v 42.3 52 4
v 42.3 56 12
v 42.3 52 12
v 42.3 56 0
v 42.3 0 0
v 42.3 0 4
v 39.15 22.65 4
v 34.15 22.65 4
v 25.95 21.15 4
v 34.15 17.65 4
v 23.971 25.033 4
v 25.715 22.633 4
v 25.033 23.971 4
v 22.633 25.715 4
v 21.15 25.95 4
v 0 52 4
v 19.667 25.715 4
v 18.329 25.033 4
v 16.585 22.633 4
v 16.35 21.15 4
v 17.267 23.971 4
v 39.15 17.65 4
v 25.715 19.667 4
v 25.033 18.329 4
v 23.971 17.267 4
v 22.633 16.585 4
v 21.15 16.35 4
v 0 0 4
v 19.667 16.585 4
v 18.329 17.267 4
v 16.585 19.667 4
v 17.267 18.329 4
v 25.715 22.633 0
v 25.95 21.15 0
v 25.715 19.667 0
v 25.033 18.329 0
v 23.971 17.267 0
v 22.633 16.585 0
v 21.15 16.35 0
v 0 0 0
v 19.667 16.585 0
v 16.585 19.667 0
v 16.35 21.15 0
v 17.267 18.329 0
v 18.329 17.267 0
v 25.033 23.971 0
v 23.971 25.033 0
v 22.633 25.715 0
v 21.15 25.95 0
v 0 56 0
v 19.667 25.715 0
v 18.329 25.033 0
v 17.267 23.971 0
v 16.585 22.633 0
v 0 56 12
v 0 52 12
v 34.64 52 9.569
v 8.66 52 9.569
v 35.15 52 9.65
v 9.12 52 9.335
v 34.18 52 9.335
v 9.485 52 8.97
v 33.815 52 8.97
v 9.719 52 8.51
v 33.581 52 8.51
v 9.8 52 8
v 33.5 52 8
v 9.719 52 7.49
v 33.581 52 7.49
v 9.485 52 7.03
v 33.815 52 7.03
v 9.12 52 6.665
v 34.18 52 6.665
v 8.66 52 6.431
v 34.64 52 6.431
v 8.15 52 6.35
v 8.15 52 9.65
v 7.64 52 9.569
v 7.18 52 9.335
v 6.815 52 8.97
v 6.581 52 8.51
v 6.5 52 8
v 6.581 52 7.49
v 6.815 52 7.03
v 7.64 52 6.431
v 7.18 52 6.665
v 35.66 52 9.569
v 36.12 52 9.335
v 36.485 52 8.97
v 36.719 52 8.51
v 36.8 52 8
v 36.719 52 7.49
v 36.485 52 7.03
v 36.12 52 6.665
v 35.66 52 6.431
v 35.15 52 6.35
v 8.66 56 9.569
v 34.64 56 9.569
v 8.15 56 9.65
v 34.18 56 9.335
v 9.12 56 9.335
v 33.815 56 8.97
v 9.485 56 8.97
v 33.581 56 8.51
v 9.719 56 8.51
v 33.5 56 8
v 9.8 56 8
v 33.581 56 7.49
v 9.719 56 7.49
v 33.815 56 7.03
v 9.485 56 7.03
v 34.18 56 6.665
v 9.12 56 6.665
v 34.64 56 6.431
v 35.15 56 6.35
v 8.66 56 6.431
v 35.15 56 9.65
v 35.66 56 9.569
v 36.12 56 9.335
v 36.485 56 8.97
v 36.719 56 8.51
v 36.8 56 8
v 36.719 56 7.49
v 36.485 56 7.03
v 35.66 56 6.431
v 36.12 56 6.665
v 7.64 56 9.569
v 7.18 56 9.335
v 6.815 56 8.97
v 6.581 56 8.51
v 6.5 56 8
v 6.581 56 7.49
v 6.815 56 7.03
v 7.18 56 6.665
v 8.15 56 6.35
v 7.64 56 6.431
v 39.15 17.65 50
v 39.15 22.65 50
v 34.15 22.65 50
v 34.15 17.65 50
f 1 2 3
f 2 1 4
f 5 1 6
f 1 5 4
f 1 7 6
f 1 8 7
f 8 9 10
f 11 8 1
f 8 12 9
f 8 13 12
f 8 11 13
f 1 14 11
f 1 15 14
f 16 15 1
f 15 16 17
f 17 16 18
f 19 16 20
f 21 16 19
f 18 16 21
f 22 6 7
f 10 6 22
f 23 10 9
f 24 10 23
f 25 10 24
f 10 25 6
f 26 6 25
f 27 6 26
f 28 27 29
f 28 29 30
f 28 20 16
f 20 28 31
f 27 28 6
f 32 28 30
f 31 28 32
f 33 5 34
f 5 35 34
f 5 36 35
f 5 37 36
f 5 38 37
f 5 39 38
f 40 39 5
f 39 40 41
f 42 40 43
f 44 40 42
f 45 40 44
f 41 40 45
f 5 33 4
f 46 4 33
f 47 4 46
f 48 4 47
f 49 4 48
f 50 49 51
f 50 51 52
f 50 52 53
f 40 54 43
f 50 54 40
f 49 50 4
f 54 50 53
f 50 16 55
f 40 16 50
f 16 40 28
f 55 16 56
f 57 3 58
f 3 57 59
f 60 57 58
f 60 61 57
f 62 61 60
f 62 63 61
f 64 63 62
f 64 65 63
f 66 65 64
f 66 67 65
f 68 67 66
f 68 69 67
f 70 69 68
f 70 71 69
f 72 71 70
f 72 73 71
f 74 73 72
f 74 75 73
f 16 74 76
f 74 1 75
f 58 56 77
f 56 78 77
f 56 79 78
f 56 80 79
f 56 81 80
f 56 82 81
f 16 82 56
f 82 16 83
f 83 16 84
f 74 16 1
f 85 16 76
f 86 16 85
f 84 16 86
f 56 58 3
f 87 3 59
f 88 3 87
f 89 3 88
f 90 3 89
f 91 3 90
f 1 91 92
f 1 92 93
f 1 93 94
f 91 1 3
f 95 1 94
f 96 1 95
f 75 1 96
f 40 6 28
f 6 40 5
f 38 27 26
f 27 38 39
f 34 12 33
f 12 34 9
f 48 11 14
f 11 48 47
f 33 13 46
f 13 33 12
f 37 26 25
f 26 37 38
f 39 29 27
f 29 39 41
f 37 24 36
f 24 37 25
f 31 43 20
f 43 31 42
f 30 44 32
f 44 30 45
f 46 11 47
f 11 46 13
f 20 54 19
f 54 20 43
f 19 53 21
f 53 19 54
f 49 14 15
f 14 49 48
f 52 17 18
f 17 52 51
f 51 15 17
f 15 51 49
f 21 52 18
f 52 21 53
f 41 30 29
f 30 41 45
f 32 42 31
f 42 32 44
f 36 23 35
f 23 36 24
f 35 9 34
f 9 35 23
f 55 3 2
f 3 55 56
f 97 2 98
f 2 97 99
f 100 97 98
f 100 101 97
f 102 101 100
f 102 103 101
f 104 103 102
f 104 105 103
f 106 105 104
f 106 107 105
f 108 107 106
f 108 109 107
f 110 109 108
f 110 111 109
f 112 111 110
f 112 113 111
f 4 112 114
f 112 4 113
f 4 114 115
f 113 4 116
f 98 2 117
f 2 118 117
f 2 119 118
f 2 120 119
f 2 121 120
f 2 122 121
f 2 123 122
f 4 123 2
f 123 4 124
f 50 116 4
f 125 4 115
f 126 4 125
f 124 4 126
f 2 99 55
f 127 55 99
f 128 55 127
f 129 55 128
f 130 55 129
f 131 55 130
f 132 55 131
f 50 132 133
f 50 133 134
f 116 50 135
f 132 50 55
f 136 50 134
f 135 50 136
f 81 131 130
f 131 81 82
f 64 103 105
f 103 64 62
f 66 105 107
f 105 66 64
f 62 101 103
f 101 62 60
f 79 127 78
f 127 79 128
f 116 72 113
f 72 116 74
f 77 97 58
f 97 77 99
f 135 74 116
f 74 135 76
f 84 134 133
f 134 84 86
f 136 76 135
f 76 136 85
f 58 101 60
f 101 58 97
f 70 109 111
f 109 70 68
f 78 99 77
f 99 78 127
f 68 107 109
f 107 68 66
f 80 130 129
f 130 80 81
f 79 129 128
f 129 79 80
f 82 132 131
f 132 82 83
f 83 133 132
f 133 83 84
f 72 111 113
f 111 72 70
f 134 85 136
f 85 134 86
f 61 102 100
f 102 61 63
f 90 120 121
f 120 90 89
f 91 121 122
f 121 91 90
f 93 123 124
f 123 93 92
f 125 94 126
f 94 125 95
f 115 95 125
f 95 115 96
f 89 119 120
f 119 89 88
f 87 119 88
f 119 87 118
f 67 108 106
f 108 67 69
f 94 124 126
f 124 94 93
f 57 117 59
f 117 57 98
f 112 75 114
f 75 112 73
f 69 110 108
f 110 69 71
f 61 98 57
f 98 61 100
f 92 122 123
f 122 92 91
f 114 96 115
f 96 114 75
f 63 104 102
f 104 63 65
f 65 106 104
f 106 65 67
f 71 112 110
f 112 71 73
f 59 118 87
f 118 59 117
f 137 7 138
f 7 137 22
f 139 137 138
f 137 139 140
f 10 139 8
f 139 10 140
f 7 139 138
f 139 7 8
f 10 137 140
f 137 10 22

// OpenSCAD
$fn = 20;

tloustka = 4;
//vyska v ose y
VvoY = 52;
// vyska motorku
vm = 42.3;
// kruh pro rouru
prumer = 4.5;
vule1 = 0.3;
//prumer der pro sroubek
p = 1.5;
vule = 0.15;
//pozice x pro rouru pro sroubek
x = vm - 30;
// posunuti valce 
tmp = 4.5;


difference(){
    cube([vm,VvoY,tloustka]);
    translate([vm / 2,vm / 2,-0.5]) 
    cylinder(r=prumer + vule1,h=5);
}

difference(){
    translate([0,VvoY,0]) cube([vm,tloustka,12]);
    translate([x/2 + 2,VvoY + tmp,8]) rotate(a = 90, v = [1,0,0]) cylinder(r=p + vule,h=5);
    translate([x/2 + 29,VvoY + tmp,8]) rotate(a = 90, v = [1,0,0]) cylinder(r=p + vule,h=5);
}

translate([vm / 2 + 13,vm / 2 - prumer + vule1 + 0.7 ,0]) cube([5,5,50]);
/*translate([42.3 / 2 - 8 - 10,42.3 / 2 - 3.1,0]) cube([5,5,50]);*/
